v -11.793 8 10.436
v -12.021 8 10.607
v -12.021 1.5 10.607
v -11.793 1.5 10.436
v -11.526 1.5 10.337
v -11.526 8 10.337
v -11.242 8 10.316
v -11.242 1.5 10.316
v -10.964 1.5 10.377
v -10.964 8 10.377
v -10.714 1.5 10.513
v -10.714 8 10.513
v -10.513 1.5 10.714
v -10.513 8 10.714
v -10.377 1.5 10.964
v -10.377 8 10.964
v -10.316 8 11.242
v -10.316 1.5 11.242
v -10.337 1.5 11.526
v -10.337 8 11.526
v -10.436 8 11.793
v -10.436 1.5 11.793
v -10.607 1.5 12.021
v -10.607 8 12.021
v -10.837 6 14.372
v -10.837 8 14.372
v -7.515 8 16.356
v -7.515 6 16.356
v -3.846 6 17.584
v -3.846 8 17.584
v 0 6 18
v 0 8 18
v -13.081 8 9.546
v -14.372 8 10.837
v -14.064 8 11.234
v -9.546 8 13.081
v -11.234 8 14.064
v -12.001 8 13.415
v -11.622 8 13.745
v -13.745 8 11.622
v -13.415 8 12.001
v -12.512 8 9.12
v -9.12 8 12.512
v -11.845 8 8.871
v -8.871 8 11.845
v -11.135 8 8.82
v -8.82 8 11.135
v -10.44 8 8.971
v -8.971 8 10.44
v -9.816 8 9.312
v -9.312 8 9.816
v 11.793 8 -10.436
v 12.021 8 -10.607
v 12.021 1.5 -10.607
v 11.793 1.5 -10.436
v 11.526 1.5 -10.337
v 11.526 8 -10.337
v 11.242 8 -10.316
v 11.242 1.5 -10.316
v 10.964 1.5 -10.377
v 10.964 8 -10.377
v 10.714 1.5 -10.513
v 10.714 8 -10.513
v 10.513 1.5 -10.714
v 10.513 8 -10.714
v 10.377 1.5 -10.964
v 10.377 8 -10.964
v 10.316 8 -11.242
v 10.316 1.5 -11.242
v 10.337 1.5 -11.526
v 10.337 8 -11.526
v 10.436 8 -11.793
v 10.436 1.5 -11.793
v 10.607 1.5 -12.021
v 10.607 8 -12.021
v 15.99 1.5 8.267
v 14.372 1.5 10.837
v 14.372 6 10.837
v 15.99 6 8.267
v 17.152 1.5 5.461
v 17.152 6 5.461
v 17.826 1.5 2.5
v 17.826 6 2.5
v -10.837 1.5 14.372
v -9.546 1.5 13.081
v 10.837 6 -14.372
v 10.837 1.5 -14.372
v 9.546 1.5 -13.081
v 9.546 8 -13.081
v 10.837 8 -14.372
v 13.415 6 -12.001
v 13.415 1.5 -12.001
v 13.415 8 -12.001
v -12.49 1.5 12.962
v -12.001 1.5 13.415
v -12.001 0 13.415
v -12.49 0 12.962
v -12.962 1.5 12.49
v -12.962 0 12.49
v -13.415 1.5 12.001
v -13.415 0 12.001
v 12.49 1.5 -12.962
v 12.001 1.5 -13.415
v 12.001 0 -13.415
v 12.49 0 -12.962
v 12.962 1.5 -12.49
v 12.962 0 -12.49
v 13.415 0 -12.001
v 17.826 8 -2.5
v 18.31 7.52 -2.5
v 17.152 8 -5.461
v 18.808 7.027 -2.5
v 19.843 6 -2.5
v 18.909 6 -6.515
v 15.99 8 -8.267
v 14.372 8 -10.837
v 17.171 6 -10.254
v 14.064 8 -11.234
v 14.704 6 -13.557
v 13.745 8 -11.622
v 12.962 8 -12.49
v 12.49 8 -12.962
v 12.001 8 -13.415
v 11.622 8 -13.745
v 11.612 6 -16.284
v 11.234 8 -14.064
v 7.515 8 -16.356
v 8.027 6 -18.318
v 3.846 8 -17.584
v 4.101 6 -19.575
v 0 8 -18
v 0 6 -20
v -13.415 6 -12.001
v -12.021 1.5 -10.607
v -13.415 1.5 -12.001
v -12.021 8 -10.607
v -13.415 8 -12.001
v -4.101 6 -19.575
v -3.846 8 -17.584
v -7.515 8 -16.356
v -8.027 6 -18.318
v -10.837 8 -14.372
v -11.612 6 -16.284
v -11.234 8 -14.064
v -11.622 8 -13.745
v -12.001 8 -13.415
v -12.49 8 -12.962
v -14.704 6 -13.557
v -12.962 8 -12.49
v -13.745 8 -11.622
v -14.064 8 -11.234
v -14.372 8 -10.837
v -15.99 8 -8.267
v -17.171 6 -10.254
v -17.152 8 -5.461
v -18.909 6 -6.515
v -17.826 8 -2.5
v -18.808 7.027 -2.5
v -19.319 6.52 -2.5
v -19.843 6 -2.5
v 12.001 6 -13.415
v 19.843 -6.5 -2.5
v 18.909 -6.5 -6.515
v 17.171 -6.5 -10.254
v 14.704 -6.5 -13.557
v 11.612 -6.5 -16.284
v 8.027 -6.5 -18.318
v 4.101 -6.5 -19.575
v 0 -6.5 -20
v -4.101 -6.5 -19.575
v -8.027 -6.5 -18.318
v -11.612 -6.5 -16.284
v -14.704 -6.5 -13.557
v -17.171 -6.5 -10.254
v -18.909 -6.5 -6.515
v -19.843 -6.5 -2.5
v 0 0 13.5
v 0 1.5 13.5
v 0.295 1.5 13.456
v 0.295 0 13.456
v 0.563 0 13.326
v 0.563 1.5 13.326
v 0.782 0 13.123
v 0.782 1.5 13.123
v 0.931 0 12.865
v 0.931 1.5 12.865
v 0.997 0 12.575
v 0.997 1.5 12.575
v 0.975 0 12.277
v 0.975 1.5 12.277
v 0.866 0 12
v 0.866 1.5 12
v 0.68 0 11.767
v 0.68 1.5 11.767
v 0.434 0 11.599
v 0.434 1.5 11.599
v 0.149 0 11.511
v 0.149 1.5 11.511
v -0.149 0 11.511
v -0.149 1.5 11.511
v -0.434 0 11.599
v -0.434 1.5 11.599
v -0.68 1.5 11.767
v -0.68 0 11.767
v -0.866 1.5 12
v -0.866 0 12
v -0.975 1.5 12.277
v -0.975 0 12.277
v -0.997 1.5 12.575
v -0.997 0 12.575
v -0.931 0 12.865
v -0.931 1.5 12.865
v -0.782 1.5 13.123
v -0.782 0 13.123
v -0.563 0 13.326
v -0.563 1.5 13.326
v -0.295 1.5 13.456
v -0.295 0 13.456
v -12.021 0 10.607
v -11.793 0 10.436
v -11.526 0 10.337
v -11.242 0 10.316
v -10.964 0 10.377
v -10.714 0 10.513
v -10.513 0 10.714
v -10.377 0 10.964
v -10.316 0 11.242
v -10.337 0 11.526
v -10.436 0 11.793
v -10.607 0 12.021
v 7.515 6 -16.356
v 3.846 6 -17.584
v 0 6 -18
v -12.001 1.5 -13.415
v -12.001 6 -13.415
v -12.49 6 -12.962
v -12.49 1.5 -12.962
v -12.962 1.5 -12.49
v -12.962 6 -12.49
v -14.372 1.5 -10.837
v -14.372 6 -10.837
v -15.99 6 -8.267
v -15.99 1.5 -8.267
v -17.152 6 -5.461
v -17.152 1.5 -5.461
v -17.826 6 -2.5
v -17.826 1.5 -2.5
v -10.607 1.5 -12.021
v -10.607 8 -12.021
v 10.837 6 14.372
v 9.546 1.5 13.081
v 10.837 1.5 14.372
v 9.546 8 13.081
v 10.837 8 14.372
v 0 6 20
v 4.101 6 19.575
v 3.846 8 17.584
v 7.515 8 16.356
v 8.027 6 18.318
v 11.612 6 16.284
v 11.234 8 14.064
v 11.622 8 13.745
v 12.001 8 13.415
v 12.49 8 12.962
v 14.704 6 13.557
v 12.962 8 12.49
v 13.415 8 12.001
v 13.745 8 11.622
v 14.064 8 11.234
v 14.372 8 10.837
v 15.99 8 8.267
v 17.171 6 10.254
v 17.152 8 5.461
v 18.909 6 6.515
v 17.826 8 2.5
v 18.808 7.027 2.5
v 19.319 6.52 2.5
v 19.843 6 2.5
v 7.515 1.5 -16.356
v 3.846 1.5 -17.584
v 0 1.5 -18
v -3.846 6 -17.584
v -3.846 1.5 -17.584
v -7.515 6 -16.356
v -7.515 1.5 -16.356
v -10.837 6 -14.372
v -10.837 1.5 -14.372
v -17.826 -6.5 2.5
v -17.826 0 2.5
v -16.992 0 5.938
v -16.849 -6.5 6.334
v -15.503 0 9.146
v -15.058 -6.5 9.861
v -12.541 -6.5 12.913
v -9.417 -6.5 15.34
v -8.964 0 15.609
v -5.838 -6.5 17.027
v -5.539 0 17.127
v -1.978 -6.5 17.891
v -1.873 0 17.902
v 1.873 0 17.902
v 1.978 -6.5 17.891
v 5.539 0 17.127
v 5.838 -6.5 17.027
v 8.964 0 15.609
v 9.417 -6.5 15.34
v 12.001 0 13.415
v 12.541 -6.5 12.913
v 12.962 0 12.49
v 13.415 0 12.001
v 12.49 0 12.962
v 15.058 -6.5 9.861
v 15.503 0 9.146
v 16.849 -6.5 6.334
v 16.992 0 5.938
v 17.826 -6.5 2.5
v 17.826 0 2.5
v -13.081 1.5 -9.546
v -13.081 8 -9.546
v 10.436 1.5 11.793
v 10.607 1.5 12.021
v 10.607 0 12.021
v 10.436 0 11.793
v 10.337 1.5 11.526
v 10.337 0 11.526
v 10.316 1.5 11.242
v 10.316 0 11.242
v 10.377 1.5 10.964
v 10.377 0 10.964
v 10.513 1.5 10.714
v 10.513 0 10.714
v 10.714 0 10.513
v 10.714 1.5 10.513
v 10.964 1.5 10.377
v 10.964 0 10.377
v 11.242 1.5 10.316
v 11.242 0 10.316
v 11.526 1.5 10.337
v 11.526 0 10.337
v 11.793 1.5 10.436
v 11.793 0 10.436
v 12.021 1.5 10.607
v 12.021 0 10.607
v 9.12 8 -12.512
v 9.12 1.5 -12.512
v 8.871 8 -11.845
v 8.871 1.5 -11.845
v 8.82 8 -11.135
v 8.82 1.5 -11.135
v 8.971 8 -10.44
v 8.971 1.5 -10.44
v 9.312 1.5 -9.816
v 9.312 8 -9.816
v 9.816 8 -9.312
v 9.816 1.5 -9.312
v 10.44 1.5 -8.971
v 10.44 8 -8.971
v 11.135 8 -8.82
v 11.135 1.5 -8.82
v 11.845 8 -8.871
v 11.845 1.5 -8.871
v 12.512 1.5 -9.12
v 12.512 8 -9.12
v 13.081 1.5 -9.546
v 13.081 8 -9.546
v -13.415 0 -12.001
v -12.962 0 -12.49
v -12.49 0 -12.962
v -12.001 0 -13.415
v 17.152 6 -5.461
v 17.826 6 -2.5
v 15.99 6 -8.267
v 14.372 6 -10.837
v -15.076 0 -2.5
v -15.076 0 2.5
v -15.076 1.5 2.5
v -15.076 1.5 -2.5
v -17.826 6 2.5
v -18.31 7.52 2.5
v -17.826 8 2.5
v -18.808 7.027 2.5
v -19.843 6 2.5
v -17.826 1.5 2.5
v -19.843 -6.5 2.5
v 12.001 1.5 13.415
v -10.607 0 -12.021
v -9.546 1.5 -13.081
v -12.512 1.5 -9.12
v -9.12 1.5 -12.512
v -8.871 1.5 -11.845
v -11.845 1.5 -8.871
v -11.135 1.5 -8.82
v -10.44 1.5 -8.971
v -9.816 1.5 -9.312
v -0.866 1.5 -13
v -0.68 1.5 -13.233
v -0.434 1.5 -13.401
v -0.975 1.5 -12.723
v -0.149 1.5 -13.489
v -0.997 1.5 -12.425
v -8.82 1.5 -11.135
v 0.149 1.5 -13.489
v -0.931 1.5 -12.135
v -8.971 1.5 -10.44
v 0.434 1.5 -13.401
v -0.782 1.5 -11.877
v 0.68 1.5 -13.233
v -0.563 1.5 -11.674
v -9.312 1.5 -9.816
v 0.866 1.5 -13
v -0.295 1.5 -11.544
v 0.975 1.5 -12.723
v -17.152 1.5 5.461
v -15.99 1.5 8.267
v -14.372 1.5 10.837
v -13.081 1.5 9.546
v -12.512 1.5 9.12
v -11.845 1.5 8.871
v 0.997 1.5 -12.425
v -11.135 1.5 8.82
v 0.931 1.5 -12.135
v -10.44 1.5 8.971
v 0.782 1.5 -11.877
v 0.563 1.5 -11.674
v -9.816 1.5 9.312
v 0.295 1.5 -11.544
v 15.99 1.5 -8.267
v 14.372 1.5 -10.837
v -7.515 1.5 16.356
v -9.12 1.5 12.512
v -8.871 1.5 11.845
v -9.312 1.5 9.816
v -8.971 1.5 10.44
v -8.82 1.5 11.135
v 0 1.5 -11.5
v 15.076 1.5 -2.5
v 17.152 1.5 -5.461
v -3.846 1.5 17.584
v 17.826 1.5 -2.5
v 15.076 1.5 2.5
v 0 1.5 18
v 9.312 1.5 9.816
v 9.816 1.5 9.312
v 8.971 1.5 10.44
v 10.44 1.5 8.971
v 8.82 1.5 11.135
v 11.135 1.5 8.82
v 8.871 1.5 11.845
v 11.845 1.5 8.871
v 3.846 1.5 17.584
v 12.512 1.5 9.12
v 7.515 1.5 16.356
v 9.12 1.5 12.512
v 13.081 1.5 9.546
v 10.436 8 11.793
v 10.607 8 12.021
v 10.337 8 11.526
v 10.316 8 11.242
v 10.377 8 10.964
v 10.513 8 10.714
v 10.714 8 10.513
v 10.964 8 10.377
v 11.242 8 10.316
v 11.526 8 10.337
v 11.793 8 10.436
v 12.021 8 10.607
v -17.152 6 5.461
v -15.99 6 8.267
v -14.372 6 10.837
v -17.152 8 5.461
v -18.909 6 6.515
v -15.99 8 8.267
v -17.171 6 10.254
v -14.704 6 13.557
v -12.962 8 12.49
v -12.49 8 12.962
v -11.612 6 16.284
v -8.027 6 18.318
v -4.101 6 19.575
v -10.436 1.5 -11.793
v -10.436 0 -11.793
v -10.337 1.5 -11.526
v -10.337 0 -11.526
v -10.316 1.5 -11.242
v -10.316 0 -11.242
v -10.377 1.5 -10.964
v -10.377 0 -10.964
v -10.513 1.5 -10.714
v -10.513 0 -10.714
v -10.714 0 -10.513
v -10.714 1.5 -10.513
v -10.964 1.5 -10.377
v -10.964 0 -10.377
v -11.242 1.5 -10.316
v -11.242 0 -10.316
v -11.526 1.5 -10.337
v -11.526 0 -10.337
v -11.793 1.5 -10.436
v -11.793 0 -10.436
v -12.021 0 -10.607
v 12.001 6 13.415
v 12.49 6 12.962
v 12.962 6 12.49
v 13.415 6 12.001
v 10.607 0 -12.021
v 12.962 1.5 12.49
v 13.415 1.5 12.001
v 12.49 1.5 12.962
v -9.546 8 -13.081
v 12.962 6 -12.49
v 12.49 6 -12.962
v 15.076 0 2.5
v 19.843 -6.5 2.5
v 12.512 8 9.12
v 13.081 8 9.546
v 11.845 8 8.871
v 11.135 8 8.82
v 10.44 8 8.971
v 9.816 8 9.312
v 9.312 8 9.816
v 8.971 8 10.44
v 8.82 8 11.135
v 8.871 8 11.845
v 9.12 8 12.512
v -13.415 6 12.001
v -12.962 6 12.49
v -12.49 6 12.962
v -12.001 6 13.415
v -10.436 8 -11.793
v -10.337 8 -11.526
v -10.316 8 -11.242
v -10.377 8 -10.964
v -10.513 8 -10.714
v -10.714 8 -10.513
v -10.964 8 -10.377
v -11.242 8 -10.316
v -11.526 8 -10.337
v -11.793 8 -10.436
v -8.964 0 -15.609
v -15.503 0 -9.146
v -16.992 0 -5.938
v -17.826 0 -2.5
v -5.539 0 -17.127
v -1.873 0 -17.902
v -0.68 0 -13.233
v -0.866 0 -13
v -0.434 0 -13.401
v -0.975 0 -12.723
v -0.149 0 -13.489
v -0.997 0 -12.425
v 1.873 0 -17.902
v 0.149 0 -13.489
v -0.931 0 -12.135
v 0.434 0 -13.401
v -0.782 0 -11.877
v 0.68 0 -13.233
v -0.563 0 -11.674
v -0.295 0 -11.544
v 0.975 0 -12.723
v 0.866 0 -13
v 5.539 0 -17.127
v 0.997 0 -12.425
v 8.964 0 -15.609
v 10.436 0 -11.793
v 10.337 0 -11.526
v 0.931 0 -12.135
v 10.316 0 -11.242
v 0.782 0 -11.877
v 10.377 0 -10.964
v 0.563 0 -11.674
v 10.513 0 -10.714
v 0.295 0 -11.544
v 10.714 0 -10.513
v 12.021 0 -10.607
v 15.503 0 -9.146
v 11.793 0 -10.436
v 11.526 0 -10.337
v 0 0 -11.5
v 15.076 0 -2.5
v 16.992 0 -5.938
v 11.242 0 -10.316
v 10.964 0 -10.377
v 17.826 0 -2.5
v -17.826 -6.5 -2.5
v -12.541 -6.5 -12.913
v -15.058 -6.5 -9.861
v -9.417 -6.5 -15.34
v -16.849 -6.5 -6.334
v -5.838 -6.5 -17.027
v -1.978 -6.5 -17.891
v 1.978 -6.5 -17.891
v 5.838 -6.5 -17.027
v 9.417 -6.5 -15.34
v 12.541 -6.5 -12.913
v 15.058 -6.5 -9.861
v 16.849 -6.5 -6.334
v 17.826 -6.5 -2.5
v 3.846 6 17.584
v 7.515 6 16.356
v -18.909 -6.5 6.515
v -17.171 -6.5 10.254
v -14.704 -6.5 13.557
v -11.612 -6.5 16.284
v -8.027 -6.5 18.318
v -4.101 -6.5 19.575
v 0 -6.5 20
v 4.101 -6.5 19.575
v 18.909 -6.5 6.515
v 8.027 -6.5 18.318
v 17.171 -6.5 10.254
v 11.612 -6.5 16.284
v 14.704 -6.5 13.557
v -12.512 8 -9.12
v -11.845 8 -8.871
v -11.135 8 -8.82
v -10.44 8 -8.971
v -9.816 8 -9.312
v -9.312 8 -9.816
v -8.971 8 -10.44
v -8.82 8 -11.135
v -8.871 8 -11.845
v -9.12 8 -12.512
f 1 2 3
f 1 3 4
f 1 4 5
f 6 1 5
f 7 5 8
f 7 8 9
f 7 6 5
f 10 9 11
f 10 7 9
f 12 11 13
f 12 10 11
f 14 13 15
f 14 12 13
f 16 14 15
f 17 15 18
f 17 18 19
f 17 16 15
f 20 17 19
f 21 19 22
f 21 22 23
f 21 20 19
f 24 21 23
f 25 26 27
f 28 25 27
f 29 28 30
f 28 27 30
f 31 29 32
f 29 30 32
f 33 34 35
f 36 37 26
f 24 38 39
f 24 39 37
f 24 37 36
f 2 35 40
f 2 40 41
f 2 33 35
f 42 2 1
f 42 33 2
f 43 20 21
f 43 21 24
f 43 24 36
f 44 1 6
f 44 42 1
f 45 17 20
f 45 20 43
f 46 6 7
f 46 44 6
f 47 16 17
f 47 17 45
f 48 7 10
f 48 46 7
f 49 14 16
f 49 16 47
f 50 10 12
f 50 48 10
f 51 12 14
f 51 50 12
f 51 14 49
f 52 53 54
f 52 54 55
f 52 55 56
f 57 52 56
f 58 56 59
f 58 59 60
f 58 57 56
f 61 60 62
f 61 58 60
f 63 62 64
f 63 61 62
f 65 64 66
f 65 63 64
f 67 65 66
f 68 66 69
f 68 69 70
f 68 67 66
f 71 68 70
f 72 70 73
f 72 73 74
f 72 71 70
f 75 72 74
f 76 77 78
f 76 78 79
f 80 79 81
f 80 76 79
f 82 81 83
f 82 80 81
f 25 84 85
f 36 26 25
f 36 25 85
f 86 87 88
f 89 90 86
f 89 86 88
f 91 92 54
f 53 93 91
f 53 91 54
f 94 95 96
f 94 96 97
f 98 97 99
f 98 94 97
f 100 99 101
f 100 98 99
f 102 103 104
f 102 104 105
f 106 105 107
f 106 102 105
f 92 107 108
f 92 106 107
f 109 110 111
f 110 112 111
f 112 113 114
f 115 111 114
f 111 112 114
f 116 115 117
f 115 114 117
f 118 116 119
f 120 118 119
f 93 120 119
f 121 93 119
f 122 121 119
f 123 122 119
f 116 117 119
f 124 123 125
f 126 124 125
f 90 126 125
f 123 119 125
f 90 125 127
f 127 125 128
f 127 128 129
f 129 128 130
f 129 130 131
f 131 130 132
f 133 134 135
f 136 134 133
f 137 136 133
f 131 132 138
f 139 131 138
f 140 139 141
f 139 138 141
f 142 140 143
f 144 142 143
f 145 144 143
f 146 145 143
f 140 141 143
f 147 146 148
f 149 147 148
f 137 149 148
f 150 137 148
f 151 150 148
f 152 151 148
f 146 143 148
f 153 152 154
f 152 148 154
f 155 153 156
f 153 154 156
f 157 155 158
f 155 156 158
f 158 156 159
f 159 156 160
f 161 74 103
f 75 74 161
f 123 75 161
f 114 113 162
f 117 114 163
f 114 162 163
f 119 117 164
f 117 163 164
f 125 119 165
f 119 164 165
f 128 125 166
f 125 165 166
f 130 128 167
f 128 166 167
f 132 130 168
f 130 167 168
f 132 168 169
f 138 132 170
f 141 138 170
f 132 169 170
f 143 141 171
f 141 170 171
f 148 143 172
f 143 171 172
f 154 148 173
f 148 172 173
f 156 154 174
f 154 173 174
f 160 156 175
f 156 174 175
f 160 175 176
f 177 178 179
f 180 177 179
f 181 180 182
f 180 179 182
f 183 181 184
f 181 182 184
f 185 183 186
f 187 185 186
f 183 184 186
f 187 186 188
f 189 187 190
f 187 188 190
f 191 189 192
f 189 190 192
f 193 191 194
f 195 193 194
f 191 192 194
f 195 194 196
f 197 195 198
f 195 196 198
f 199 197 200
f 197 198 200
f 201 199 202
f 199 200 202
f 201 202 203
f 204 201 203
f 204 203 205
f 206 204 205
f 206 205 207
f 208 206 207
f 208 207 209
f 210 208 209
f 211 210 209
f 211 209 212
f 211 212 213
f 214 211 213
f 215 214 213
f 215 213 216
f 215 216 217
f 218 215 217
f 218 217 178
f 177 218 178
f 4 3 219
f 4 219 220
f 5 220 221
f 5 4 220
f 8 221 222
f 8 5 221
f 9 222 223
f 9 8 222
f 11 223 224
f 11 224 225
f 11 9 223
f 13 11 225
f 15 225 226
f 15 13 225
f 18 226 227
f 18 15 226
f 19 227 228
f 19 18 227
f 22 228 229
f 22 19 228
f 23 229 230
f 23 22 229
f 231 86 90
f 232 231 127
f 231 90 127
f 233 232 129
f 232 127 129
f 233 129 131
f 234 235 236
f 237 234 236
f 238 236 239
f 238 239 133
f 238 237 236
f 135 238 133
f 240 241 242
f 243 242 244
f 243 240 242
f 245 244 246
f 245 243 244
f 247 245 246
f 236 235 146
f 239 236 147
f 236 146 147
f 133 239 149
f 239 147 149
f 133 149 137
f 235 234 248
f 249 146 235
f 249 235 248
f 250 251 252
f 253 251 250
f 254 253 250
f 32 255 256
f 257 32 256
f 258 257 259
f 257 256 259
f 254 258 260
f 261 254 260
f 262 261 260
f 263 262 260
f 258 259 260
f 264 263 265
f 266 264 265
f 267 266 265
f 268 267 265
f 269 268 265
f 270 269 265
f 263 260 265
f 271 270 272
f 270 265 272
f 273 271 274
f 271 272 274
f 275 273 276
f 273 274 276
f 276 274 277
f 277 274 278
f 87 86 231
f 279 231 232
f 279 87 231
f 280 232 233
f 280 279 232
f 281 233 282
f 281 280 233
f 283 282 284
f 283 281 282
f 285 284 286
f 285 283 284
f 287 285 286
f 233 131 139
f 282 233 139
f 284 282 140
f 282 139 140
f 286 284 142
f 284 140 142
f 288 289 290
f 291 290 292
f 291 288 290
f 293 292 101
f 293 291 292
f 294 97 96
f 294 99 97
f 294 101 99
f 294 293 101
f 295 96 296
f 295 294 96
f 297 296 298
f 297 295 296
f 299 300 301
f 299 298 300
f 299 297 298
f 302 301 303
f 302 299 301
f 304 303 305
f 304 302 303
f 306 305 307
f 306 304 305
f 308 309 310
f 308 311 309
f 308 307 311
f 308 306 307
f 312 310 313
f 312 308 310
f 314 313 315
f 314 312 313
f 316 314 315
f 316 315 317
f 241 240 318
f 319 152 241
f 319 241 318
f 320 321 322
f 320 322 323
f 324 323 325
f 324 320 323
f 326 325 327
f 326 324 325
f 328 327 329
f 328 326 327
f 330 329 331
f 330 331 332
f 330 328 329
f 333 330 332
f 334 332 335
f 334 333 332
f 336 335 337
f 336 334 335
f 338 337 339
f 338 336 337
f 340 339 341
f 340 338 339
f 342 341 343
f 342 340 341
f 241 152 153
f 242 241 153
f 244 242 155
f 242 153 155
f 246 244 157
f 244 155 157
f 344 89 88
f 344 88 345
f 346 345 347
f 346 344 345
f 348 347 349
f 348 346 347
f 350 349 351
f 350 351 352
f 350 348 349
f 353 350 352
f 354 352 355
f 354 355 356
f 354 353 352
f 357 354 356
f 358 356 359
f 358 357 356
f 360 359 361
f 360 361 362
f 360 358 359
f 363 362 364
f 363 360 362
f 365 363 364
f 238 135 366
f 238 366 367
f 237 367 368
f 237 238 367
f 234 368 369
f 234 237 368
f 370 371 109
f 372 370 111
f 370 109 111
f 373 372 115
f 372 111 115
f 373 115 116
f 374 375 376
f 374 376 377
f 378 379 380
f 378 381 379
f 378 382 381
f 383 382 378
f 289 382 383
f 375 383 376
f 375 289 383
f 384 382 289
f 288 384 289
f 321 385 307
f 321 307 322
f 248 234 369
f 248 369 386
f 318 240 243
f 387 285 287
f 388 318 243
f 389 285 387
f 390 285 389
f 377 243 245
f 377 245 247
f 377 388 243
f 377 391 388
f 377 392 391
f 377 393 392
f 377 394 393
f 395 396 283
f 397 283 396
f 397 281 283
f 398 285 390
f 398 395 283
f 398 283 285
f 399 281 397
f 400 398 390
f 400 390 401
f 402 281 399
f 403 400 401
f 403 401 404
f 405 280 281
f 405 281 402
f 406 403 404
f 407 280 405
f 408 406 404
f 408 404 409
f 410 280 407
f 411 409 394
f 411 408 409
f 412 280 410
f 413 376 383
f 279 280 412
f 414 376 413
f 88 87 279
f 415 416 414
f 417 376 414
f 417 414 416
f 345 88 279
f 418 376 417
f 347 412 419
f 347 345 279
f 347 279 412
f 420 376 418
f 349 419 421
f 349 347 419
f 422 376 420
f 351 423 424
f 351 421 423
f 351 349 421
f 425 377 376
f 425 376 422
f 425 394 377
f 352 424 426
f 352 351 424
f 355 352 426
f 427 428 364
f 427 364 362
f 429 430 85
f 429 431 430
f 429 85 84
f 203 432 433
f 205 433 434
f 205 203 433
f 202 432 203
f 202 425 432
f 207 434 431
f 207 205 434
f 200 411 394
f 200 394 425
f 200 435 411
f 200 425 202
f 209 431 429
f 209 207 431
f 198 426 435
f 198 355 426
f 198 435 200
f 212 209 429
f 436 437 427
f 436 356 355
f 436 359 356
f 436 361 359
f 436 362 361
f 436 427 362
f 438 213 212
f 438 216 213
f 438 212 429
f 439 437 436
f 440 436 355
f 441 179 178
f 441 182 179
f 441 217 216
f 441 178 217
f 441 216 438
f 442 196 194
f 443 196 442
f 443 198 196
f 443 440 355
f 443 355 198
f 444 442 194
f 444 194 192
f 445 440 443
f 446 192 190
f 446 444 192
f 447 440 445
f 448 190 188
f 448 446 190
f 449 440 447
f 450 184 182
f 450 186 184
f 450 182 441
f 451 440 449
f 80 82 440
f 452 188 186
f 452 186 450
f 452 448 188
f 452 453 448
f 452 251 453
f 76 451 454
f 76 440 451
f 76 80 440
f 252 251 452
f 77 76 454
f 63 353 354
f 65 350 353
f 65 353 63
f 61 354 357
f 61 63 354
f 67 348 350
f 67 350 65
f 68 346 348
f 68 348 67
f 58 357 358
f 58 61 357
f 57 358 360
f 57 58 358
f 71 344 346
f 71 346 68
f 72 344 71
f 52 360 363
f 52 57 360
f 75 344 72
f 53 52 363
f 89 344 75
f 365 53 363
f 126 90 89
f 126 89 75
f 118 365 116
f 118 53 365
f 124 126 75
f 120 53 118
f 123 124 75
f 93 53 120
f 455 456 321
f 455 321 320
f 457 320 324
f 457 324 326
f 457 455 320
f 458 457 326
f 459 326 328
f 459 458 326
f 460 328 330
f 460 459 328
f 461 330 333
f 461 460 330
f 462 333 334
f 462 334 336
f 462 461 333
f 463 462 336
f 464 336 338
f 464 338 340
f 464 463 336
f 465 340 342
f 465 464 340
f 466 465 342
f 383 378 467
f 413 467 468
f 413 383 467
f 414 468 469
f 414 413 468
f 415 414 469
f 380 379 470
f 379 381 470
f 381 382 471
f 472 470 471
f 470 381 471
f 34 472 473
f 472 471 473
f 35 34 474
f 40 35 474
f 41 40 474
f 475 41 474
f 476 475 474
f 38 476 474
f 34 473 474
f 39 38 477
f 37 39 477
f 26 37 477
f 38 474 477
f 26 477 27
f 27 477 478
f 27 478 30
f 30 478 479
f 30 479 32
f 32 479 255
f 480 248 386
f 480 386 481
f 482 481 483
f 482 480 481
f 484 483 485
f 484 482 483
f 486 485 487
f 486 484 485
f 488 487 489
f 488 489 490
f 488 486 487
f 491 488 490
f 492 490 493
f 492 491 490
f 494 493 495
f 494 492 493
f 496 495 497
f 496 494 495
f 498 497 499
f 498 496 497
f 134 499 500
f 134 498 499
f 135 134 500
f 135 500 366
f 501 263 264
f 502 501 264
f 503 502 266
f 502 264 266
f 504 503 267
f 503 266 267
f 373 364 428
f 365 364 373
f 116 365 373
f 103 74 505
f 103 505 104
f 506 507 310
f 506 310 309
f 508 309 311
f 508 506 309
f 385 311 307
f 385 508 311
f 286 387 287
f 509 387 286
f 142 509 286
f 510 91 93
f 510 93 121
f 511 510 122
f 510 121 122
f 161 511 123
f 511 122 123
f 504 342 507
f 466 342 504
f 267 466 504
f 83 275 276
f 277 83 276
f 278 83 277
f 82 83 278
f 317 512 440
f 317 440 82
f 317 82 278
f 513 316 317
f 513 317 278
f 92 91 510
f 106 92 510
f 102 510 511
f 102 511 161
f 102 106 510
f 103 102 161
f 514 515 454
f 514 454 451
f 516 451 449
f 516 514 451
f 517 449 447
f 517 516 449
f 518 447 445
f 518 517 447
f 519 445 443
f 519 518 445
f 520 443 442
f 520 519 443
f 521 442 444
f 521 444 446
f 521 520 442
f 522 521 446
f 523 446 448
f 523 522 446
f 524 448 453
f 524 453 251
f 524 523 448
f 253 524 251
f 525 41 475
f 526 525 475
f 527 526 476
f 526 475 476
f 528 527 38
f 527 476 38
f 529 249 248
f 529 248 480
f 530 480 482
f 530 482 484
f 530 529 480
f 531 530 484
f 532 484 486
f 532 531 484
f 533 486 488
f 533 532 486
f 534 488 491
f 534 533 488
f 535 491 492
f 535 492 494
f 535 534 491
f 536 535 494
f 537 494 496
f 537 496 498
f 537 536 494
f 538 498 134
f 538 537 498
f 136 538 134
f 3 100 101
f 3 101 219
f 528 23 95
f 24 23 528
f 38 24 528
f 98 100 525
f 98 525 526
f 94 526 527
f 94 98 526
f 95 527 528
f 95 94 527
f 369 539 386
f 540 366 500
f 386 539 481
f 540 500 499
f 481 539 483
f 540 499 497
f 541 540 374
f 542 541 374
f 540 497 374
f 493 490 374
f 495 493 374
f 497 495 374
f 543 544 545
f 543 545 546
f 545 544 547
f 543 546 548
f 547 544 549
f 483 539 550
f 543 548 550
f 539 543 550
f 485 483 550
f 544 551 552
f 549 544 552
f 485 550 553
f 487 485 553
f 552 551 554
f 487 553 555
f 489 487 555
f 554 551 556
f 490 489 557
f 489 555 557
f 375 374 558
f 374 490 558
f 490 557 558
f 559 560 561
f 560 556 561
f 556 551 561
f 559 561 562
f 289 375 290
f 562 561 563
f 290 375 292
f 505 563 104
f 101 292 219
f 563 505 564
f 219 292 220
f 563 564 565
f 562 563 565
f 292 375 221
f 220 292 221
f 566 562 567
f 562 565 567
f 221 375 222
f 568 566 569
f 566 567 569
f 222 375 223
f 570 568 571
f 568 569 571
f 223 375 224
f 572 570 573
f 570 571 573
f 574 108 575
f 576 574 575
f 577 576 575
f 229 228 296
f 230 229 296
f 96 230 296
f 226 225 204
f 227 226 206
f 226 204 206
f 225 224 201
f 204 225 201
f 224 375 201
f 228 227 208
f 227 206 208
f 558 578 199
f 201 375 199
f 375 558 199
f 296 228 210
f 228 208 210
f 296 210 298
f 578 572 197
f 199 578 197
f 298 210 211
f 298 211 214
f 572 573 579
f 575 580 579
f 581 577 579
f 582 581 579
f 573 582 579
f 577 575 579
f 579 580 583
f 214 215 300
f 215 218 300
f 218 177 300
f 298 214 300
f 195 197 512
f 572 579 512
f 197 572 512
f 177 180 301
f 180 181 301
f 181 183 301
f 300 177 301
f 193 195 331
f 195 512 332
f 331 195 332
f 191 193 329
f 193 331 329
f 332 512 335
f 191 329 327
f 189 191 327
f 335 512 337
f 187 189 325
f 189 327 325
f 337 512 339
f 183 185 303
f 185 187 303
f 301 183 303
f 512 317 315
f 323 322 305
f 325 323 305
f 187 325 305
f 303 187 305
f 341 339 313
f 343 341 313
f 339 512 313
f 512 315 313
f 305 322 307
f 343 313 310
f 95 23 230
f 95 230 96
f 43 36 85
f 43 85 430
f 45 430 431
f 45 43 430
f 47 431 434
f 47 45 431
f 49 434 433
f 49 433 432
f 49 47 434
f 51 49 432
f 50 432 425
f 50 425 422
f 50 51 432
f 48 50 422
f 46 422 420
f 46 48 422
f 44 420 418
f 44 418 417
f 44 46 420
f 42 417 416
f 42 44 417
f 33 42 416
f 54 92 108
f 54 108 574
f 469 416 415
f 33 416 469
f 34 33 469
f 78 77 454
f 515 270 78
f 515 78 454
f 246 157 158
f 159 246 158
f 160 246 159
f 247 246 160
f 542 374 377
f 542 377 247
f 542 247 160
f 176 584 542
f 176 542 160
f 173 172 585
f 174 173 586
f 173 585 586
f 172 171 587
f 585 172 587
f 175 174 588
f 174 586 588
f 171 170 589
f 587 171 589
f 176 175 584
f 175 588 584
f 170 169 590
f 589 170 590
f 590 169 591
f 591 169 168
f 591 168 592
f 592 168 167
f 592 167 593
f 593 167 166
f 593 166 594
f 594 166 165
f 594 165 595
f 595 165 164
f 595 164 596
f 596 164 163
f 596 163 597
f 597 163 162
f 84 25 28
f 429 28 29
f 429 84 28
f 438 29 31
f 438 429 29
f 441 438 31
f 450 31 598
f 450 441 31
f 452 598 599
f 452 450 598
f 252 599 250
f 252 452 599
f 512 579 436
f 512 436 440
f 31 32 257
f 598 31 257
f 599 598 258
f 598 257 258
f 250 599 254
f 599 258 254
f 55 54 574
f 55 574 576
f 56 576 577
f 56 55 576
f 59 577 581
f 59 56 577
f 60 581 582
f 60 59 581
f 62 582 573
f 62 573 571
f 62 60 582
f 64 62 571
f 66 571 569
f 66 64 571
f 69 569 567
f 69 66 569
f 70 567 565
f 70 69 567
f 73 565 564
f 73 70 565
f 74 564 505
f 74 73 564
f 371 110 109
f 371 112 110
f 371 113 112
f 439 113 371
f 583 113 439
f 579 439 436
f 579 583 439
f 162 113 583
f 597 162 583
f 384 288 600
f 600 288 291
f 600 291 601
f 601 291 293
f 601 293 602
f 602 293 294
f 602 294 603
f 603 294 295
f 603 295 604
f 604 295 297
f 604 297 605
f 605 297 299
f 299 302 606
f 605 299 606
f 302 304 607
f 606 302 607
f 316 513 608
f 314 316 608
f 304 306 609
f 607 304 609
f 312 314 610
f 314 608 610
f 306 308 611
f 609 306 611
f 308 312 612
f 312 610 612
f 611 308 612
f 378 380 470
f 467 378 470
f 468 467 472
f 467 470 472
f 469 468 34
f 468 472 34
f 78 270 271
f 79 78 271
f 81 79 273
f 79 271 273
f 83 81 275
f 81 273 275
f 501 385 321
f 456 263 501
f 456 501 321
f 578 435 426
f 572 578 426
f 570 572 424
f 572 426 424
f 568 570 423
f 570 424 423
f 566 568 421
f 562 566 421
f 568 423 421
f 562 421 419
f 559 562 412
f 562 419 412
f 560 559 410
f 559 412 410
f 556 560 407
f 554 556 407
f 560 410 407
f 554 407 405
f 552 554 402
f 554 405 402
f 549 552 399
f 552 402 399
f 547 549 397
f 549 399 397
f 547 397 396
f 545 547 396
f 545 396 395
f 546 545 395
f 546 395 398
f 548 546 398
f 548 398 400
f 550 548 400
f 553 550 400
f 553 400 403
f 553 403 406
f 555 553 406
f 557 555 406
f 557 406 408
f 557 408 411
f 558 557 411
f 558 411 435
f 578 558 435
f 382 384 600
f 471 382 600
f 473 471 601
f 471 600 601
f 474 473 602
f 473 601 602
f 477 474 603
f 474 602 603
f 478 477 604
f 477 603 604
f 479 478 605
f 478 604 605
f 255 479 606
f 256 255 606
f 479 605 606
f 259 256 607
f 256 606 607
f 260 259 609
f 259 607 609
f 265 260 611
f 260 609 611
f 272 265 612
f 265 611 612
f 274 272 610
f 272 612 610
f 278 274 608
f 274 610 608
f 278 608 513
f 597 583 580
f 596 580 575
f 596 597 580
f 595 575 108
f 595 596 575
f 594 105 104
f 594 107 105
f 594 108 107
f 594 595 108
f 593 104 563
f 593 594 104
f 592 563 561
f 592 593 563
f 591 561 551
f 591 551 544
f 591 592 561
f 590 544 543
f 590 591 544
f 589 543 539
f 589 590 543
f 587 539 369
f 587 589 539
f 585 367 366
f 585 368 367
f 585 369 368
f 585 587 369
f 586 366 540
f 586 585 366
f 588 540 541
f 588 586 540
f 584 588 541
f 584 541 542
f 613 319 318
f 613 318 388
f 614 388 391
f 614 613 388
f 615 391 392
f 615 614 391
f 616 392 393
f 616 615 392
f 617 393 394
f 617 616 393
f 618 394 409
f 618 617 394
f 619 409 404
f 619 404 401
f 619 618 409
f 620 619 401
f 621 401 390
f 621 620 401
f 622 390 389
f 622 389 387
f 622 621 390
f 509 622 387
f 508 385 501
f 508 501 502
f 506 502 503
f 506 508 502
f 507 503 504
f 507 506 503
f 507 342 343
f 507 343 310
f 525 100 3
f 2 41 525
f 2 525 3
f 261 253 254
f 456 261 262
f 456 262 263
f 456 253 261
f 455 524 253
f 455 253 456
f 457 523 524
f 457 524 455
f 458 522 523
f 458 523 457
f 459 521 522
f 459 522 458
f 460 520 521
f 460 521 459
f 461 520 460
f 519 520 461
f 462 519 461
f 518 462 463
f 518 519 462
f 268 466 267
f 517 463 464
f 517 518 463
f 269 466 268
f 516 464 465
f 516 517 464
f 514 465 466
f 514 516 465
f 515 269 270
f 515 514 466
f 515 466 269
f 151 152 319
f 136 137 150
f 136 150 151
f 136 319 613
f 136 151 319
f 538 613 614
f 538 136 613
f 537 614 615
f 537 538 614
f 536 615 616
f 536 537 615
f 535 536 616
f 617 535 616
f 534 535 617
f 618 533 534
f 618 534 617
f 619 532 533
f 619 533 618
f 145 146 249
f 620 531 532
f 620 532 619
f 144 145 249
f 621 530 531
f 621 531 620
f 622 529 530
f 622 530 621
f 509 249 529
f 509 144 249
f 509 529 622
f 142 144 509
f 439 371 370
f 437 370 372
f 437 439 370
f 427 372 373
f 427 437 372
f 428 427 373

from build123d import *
from build123d.topology import SkipClean

# Parameters (mm, degrees)
SKETCH_1_R               = 18
EXTRUDE_1_DEPTH          = 1.5
EXTRUDE_2_DEPTH          = 6
EXTRUDE_2_DEPTH_BACK     = 6.5
SKETCH_2_R               = 20
SKETCH_2_R_2             = 18
CUT_EXTRUDE_START        = 1.5
SKETCH_6_R               = 1
CUT_EXTRUDE_4_DEPTH      = 8
CUT_EXTRUDE_5_DEPTH      = 30.393876913
CUT_EXTRUDE_5_DEPTH_BACK = 30.393876913
CUT_EXTRUDE_6_DEPTH      = 1.5
EXTRUDE_START            = 8
EXTRUDE_3_DEPTH          = 6.5


with BuildPart() as part:
    # 草图1 → 凸台-拉伸1 (new body)
    with BuildSketch(Plane(origin=(0, 0, 0), x_dir=(1, 0, 0), z_dir=(0, 1, 0))):
        with Locations(Location((0, 0, 0), (0, 0, 270))):
            Circle(SKETCH_1_R)
    extrude(amount=EXTRUDE_1_DEPTH)

    # 草图2 → 凸台-拉伸2 (add, two sides: drawn at the far end of the back side and taken through both)
    with BuildSketch(Plane(origin=(0, 0, 0), x_dir=(1, 0, 0), z_dir=(0, 1, 0)).offset(-EXTRUDE_2_DEPTH_BACK)):
        with Locations(Location((0, 0, 0), (0, 0, 270))):
            Circle(SKETCH_2_R)
        with Locations(Location((0, 0, 0), (0, 0, 270))):
            Circle(SKETCH_2_R_2, mode=Mode.SUBTRACT)
    extrude(amount=EXTRUDE_2_DEPTH + EXTRUDE_2_DEPTH_BACK)

    # 扫描2: sweep along a curve in space
    with SkipClean():  # the faces are left unmerged after this step: merging them gives an invalid solid
        with BuildLine() as sweep_2_path:
            ThreePointArc((0, 6, 18), (12.727922061, 6, 12.727922061), (18, 6, 0))
            ThreePointArc((18, 6, 0), (12.727922061, 6, -12.727922061), (0, 6, -18))
            ThreePointArc((0, 6, -18), (-12.727922061, 6, -12.727922061), (-18, 6, 0))
            ThreePointArc((-18, 6, 0), (-12.727922061, 6, 12.727922061), (0, 6, 18))
        # 草图5 → 扫描2 (sweep)
        with BuildSketch(Plane.XY):
            Polygon((-20, 6), (-18, 6), (-18, 8), align=None)
        sweep(path=sweep_2_path.line)

    # 草图6 → 切除-拉伸4 (cut)
    with SkipClean():  # the faces are left unmerged after this step: merging them gives an invalid solid
        with BuildSketch(Plane(origin=(0, 0, 0), x_dir=(1, 0, 0), z_dir=(0, 1, 0)).offset(CUT_EXTRUDE_START)):
            with Locations(Location((0, -12.5, 0), (0, 0, 270))):
                Circle(SKETCH_6_R)
            with Locations(Location((0, 12.5, 0), (0, 0, 270))):
                Circle(SKETCH_6_R)
        extrude(amount=-CUT_EXTRUDE_4_DEPTH, mode=Mode.SUBTRACT)

    # 草图7 → 切除-拉伸5 (cut, two sides: drawn at the far end of the back side and taken through both)
    with BuildSketch(Plane(origin=(0, 0, 0), x_dir=(1, 0, 0), z_dir=(0, 1, 0)).offset(-CUT_EXTRUDE_5_DEPTH_BACK)):
        with BuildLine():
            Line((-19.843134833, -2.5), (-15.07554347, -2.5))
            Line((-15.07554347, -2.5), (-15.07554347, 2.5))
            Line((-15.07554347, 2.5), (-19.843134833, 2.5))
            ThreePointArc((-19.843134833, 2.5), (-20, 0), (-19.843134833, -2.5))
        make_face()
        with BuildLine():
            Line((15.07554347, 2.5), (15.07554347, -2.5))
            Line((15.07554347, -2.5), (19.843134833, -2.5))
            ThreePointArc((19.843134833, -2.5), (20, 0), (19.843134833, 2.5))
            Line((19.843134833, 2.5), (15.07554347, 2.5))
        make_face()
    extrude(amount=CUT_EXTRUDE_5_DEPTH + CUT_EXTRUDE_5_DEPTH_BACK, mode=Mode.SUBTRACT)

    # 草图8 → 切除-拉伸6 (cut)
    with SkipClean():  # the faces are left unmerged after this step: merging them gives an invalid solid
        with BuildSketch(Plane(origin=(0, 0, 0), x_dir=(1, 0, 0), z_dir=(0, 1, 0)).offset(CUT_EXTRUDE_START)):
            with BuildLine():
                Line((10.606601706, 12.020815293), (12.001158233, 13.41537182))
                ThreePointArc((12.001158233, 13.41537182), (12.727922049, 12.727922074), (13.415371797, 12.001158259))
                Line((13.415371797, 12.001158259), (12.020815268, 10.606601731))
                ThreePointArc((12.020815268, 10.606601731), (10.606601706, 10.606601706), (10.606601706, 12.020815293))
            make_face()
            with BuildLine():
                Line((12.020815268, -10.606601731), (13.415371797, -12.001158259))
                ThreePointArc((13.415371797, -12.001158259), (12.727922049, -12.727922074), (12.001158233, -13.41537182))
                Line((12.001158233, -13.41537182), (10.606601706, -12.020815293))
                ThreePointArc((10.606601706, -12.020815293), (10.606601706, -10.606601706), (12.020815268, -10.606601731))
            make_face()
            with BuildLine():
                Line((-10.606601706, -12.020815293), (-12.001158233, -13.41537182))
                ThreePointArc((-12.001158233, -13.41537182), (-12.727922049, -12.727922074), (-13.415371797, -12.001158259))
                Line((-13.415371797, -12.001158259), (-12.020815268, -10.606601731))
                ThreePointArc((-12.020815268, -10.606601731), (-10.606601706, -10.606601706), (-10.606601706, -12.020815293))
            make_face()
            with BuildLine():
                Line((-12.020815268, 10.606601731), (-13.415371797, 12.001158259))
                ThreePointArc((-13.415371797, 12.001158259), (-12.727922049, 12.727922074), (-12.001158233, 13.41537182))
                Line((-12.001158233, 13.41537182), (-10.606601706, 12.020815293))
                ThreePointArc((-10.606601706, 12.020815293), (-10.606601706, 10.606601706), (-12.020815268, 10.606601731))
            make_face()
        extrude(amount=-CUT_EXTRUDE_6_DEPTH, mode=Mode.SUBTRACT)

    # 草图9 → 凸台-拉伸3 (add)
    with SkipClean():  # the faces are left unmerged after this step: merging them gives an invalid solid
        with BuildSketch(Plane(origin=(0, 0, 0), x_dir=(1, 0, 0), z_dir=(0, 1, 0)).offset(EXTRUDE_START)):
            with BuildLine():
                Line((12.020815268, -10.606601731), (13.415371797, -12.001158259))
                ThreePointArc((13.415371797, -12.001158259), (13.906042657, -11.428997228), (14.372329608, -10.836795727))
                Line((14.372329608, -10.836795727), (13.081475446, -9.545941553))
                ThreePointArc((13.081475446, -9.545941553), (9.545941558, -9.545941548), (9.545941537, -13.081475443))
                Line((9.545941537, -13.081475443), (10.8367957, -14.372329629))
                ThreePointArc((10.8367957, -14.372329629), (11.428997201, -13.906042679), (12.001158233, -13.41537182))
                Line((12.001158233, -13.41537182), (10.606601718, -12.020815281))
                ThreePointArc((10.606601718, -12.020815281), (10.606601731, -10.606601731), (12.020815268, -10.606601731))
            make_face()
            with BuildLine():
                Line((-10.606601718, -12.020815281), (-12.001158233, -13.41537182))
                ThreePointArc((-12.001158233, -13.41537182), (-11.428997201, -13.906042679), (-10.8367957, -14.372329629))
                Line((-10.8367957, -14.372329629), (-9.545941547, -13.081475453))
                ThreePointArc((-9.545941547, -13.081475453), (-9.545941551, -9.545941542), (-13.081475462, -9.545941556))
                Line((-13.081475462, -9.545941556), (-14.372329609, -10.836795726))
                ThreePointArc((-14.372329609, -10.836795726), (-13.906042657, -11.428997227), (-13.415371797, -12.001158259))
                Line((-13.415371797, -12.001158259), (-12.020815281, -10.606601718))
                ThreePointArc((-12.020815281, -10.606601718), (-10.606601718, -10.606601718), (-10.606601718, -12.020815281))
            make_face()
            with BuildLine():
                Line((10.606601718, 12.020815281), (12.001158233, 13.41537182))
                ThreePointArc((12.001158233, 13.41537182), (11.428997201, 13.906042679), (10.8367957, 14.372329629))
                Line((10.8367957, 14.372329629), (9.545941547, 13.081475453))
                ThreePointArc((9.545941547, 13.081475453), (9.545941551, 9.545941542), (13.081475462, 9.545941556))
                Line((13.081475462, 9.545941556), (14.372329609, 10.836795726))
                ThreePointArc((14.372329609, 10.836795726), (13.906042657, 11.428997227), (13.415371797, 12.001158259))
                Line((13.415371797, 12.001158259), (12.020815281, 10.606601718))
                ThreePointArc((12.020815281, 10.606601718), (10.606601718, 10.606601718), (10.606601718, 12.020815281))
            make_face()
            with BuildLine():
                Line((-12.020815268, 10.606601731), (-13.415371797, 12.001158259))
                ThreePointArc((-13.415371797, 12.001158259), (-13.906042657, 11.428997228), (-14.372329608, 10.836795727))
                Line((-14.372329608, 10.836795727), (-13.081475446, 9.545941553))
                ThreePointArc((-13.081475446, 9.545941553), (-9.545941558, 9.545941548), (-9.545941537, 13.081475443))
                Line((-9.545941537, 13.081475443), (-10.8367957, 14.372329629))
                ThreePointArc((-10.8367957, 14.372329629), (-11.428997201, 13.906042679), (-12.001158233, 13.41537182))
                Line((-12.001158233, 13.41537182), (-10.606601718, 12.020815281))
                ThreePointArc((-10.606601718, 12.020815281), (-10.606601731, 10.606601731), (-12.020815268, 10.606601731))
            make_face()
        extrude(amount=-EXTRUDE_3_DEPTH)


solid = part.part
